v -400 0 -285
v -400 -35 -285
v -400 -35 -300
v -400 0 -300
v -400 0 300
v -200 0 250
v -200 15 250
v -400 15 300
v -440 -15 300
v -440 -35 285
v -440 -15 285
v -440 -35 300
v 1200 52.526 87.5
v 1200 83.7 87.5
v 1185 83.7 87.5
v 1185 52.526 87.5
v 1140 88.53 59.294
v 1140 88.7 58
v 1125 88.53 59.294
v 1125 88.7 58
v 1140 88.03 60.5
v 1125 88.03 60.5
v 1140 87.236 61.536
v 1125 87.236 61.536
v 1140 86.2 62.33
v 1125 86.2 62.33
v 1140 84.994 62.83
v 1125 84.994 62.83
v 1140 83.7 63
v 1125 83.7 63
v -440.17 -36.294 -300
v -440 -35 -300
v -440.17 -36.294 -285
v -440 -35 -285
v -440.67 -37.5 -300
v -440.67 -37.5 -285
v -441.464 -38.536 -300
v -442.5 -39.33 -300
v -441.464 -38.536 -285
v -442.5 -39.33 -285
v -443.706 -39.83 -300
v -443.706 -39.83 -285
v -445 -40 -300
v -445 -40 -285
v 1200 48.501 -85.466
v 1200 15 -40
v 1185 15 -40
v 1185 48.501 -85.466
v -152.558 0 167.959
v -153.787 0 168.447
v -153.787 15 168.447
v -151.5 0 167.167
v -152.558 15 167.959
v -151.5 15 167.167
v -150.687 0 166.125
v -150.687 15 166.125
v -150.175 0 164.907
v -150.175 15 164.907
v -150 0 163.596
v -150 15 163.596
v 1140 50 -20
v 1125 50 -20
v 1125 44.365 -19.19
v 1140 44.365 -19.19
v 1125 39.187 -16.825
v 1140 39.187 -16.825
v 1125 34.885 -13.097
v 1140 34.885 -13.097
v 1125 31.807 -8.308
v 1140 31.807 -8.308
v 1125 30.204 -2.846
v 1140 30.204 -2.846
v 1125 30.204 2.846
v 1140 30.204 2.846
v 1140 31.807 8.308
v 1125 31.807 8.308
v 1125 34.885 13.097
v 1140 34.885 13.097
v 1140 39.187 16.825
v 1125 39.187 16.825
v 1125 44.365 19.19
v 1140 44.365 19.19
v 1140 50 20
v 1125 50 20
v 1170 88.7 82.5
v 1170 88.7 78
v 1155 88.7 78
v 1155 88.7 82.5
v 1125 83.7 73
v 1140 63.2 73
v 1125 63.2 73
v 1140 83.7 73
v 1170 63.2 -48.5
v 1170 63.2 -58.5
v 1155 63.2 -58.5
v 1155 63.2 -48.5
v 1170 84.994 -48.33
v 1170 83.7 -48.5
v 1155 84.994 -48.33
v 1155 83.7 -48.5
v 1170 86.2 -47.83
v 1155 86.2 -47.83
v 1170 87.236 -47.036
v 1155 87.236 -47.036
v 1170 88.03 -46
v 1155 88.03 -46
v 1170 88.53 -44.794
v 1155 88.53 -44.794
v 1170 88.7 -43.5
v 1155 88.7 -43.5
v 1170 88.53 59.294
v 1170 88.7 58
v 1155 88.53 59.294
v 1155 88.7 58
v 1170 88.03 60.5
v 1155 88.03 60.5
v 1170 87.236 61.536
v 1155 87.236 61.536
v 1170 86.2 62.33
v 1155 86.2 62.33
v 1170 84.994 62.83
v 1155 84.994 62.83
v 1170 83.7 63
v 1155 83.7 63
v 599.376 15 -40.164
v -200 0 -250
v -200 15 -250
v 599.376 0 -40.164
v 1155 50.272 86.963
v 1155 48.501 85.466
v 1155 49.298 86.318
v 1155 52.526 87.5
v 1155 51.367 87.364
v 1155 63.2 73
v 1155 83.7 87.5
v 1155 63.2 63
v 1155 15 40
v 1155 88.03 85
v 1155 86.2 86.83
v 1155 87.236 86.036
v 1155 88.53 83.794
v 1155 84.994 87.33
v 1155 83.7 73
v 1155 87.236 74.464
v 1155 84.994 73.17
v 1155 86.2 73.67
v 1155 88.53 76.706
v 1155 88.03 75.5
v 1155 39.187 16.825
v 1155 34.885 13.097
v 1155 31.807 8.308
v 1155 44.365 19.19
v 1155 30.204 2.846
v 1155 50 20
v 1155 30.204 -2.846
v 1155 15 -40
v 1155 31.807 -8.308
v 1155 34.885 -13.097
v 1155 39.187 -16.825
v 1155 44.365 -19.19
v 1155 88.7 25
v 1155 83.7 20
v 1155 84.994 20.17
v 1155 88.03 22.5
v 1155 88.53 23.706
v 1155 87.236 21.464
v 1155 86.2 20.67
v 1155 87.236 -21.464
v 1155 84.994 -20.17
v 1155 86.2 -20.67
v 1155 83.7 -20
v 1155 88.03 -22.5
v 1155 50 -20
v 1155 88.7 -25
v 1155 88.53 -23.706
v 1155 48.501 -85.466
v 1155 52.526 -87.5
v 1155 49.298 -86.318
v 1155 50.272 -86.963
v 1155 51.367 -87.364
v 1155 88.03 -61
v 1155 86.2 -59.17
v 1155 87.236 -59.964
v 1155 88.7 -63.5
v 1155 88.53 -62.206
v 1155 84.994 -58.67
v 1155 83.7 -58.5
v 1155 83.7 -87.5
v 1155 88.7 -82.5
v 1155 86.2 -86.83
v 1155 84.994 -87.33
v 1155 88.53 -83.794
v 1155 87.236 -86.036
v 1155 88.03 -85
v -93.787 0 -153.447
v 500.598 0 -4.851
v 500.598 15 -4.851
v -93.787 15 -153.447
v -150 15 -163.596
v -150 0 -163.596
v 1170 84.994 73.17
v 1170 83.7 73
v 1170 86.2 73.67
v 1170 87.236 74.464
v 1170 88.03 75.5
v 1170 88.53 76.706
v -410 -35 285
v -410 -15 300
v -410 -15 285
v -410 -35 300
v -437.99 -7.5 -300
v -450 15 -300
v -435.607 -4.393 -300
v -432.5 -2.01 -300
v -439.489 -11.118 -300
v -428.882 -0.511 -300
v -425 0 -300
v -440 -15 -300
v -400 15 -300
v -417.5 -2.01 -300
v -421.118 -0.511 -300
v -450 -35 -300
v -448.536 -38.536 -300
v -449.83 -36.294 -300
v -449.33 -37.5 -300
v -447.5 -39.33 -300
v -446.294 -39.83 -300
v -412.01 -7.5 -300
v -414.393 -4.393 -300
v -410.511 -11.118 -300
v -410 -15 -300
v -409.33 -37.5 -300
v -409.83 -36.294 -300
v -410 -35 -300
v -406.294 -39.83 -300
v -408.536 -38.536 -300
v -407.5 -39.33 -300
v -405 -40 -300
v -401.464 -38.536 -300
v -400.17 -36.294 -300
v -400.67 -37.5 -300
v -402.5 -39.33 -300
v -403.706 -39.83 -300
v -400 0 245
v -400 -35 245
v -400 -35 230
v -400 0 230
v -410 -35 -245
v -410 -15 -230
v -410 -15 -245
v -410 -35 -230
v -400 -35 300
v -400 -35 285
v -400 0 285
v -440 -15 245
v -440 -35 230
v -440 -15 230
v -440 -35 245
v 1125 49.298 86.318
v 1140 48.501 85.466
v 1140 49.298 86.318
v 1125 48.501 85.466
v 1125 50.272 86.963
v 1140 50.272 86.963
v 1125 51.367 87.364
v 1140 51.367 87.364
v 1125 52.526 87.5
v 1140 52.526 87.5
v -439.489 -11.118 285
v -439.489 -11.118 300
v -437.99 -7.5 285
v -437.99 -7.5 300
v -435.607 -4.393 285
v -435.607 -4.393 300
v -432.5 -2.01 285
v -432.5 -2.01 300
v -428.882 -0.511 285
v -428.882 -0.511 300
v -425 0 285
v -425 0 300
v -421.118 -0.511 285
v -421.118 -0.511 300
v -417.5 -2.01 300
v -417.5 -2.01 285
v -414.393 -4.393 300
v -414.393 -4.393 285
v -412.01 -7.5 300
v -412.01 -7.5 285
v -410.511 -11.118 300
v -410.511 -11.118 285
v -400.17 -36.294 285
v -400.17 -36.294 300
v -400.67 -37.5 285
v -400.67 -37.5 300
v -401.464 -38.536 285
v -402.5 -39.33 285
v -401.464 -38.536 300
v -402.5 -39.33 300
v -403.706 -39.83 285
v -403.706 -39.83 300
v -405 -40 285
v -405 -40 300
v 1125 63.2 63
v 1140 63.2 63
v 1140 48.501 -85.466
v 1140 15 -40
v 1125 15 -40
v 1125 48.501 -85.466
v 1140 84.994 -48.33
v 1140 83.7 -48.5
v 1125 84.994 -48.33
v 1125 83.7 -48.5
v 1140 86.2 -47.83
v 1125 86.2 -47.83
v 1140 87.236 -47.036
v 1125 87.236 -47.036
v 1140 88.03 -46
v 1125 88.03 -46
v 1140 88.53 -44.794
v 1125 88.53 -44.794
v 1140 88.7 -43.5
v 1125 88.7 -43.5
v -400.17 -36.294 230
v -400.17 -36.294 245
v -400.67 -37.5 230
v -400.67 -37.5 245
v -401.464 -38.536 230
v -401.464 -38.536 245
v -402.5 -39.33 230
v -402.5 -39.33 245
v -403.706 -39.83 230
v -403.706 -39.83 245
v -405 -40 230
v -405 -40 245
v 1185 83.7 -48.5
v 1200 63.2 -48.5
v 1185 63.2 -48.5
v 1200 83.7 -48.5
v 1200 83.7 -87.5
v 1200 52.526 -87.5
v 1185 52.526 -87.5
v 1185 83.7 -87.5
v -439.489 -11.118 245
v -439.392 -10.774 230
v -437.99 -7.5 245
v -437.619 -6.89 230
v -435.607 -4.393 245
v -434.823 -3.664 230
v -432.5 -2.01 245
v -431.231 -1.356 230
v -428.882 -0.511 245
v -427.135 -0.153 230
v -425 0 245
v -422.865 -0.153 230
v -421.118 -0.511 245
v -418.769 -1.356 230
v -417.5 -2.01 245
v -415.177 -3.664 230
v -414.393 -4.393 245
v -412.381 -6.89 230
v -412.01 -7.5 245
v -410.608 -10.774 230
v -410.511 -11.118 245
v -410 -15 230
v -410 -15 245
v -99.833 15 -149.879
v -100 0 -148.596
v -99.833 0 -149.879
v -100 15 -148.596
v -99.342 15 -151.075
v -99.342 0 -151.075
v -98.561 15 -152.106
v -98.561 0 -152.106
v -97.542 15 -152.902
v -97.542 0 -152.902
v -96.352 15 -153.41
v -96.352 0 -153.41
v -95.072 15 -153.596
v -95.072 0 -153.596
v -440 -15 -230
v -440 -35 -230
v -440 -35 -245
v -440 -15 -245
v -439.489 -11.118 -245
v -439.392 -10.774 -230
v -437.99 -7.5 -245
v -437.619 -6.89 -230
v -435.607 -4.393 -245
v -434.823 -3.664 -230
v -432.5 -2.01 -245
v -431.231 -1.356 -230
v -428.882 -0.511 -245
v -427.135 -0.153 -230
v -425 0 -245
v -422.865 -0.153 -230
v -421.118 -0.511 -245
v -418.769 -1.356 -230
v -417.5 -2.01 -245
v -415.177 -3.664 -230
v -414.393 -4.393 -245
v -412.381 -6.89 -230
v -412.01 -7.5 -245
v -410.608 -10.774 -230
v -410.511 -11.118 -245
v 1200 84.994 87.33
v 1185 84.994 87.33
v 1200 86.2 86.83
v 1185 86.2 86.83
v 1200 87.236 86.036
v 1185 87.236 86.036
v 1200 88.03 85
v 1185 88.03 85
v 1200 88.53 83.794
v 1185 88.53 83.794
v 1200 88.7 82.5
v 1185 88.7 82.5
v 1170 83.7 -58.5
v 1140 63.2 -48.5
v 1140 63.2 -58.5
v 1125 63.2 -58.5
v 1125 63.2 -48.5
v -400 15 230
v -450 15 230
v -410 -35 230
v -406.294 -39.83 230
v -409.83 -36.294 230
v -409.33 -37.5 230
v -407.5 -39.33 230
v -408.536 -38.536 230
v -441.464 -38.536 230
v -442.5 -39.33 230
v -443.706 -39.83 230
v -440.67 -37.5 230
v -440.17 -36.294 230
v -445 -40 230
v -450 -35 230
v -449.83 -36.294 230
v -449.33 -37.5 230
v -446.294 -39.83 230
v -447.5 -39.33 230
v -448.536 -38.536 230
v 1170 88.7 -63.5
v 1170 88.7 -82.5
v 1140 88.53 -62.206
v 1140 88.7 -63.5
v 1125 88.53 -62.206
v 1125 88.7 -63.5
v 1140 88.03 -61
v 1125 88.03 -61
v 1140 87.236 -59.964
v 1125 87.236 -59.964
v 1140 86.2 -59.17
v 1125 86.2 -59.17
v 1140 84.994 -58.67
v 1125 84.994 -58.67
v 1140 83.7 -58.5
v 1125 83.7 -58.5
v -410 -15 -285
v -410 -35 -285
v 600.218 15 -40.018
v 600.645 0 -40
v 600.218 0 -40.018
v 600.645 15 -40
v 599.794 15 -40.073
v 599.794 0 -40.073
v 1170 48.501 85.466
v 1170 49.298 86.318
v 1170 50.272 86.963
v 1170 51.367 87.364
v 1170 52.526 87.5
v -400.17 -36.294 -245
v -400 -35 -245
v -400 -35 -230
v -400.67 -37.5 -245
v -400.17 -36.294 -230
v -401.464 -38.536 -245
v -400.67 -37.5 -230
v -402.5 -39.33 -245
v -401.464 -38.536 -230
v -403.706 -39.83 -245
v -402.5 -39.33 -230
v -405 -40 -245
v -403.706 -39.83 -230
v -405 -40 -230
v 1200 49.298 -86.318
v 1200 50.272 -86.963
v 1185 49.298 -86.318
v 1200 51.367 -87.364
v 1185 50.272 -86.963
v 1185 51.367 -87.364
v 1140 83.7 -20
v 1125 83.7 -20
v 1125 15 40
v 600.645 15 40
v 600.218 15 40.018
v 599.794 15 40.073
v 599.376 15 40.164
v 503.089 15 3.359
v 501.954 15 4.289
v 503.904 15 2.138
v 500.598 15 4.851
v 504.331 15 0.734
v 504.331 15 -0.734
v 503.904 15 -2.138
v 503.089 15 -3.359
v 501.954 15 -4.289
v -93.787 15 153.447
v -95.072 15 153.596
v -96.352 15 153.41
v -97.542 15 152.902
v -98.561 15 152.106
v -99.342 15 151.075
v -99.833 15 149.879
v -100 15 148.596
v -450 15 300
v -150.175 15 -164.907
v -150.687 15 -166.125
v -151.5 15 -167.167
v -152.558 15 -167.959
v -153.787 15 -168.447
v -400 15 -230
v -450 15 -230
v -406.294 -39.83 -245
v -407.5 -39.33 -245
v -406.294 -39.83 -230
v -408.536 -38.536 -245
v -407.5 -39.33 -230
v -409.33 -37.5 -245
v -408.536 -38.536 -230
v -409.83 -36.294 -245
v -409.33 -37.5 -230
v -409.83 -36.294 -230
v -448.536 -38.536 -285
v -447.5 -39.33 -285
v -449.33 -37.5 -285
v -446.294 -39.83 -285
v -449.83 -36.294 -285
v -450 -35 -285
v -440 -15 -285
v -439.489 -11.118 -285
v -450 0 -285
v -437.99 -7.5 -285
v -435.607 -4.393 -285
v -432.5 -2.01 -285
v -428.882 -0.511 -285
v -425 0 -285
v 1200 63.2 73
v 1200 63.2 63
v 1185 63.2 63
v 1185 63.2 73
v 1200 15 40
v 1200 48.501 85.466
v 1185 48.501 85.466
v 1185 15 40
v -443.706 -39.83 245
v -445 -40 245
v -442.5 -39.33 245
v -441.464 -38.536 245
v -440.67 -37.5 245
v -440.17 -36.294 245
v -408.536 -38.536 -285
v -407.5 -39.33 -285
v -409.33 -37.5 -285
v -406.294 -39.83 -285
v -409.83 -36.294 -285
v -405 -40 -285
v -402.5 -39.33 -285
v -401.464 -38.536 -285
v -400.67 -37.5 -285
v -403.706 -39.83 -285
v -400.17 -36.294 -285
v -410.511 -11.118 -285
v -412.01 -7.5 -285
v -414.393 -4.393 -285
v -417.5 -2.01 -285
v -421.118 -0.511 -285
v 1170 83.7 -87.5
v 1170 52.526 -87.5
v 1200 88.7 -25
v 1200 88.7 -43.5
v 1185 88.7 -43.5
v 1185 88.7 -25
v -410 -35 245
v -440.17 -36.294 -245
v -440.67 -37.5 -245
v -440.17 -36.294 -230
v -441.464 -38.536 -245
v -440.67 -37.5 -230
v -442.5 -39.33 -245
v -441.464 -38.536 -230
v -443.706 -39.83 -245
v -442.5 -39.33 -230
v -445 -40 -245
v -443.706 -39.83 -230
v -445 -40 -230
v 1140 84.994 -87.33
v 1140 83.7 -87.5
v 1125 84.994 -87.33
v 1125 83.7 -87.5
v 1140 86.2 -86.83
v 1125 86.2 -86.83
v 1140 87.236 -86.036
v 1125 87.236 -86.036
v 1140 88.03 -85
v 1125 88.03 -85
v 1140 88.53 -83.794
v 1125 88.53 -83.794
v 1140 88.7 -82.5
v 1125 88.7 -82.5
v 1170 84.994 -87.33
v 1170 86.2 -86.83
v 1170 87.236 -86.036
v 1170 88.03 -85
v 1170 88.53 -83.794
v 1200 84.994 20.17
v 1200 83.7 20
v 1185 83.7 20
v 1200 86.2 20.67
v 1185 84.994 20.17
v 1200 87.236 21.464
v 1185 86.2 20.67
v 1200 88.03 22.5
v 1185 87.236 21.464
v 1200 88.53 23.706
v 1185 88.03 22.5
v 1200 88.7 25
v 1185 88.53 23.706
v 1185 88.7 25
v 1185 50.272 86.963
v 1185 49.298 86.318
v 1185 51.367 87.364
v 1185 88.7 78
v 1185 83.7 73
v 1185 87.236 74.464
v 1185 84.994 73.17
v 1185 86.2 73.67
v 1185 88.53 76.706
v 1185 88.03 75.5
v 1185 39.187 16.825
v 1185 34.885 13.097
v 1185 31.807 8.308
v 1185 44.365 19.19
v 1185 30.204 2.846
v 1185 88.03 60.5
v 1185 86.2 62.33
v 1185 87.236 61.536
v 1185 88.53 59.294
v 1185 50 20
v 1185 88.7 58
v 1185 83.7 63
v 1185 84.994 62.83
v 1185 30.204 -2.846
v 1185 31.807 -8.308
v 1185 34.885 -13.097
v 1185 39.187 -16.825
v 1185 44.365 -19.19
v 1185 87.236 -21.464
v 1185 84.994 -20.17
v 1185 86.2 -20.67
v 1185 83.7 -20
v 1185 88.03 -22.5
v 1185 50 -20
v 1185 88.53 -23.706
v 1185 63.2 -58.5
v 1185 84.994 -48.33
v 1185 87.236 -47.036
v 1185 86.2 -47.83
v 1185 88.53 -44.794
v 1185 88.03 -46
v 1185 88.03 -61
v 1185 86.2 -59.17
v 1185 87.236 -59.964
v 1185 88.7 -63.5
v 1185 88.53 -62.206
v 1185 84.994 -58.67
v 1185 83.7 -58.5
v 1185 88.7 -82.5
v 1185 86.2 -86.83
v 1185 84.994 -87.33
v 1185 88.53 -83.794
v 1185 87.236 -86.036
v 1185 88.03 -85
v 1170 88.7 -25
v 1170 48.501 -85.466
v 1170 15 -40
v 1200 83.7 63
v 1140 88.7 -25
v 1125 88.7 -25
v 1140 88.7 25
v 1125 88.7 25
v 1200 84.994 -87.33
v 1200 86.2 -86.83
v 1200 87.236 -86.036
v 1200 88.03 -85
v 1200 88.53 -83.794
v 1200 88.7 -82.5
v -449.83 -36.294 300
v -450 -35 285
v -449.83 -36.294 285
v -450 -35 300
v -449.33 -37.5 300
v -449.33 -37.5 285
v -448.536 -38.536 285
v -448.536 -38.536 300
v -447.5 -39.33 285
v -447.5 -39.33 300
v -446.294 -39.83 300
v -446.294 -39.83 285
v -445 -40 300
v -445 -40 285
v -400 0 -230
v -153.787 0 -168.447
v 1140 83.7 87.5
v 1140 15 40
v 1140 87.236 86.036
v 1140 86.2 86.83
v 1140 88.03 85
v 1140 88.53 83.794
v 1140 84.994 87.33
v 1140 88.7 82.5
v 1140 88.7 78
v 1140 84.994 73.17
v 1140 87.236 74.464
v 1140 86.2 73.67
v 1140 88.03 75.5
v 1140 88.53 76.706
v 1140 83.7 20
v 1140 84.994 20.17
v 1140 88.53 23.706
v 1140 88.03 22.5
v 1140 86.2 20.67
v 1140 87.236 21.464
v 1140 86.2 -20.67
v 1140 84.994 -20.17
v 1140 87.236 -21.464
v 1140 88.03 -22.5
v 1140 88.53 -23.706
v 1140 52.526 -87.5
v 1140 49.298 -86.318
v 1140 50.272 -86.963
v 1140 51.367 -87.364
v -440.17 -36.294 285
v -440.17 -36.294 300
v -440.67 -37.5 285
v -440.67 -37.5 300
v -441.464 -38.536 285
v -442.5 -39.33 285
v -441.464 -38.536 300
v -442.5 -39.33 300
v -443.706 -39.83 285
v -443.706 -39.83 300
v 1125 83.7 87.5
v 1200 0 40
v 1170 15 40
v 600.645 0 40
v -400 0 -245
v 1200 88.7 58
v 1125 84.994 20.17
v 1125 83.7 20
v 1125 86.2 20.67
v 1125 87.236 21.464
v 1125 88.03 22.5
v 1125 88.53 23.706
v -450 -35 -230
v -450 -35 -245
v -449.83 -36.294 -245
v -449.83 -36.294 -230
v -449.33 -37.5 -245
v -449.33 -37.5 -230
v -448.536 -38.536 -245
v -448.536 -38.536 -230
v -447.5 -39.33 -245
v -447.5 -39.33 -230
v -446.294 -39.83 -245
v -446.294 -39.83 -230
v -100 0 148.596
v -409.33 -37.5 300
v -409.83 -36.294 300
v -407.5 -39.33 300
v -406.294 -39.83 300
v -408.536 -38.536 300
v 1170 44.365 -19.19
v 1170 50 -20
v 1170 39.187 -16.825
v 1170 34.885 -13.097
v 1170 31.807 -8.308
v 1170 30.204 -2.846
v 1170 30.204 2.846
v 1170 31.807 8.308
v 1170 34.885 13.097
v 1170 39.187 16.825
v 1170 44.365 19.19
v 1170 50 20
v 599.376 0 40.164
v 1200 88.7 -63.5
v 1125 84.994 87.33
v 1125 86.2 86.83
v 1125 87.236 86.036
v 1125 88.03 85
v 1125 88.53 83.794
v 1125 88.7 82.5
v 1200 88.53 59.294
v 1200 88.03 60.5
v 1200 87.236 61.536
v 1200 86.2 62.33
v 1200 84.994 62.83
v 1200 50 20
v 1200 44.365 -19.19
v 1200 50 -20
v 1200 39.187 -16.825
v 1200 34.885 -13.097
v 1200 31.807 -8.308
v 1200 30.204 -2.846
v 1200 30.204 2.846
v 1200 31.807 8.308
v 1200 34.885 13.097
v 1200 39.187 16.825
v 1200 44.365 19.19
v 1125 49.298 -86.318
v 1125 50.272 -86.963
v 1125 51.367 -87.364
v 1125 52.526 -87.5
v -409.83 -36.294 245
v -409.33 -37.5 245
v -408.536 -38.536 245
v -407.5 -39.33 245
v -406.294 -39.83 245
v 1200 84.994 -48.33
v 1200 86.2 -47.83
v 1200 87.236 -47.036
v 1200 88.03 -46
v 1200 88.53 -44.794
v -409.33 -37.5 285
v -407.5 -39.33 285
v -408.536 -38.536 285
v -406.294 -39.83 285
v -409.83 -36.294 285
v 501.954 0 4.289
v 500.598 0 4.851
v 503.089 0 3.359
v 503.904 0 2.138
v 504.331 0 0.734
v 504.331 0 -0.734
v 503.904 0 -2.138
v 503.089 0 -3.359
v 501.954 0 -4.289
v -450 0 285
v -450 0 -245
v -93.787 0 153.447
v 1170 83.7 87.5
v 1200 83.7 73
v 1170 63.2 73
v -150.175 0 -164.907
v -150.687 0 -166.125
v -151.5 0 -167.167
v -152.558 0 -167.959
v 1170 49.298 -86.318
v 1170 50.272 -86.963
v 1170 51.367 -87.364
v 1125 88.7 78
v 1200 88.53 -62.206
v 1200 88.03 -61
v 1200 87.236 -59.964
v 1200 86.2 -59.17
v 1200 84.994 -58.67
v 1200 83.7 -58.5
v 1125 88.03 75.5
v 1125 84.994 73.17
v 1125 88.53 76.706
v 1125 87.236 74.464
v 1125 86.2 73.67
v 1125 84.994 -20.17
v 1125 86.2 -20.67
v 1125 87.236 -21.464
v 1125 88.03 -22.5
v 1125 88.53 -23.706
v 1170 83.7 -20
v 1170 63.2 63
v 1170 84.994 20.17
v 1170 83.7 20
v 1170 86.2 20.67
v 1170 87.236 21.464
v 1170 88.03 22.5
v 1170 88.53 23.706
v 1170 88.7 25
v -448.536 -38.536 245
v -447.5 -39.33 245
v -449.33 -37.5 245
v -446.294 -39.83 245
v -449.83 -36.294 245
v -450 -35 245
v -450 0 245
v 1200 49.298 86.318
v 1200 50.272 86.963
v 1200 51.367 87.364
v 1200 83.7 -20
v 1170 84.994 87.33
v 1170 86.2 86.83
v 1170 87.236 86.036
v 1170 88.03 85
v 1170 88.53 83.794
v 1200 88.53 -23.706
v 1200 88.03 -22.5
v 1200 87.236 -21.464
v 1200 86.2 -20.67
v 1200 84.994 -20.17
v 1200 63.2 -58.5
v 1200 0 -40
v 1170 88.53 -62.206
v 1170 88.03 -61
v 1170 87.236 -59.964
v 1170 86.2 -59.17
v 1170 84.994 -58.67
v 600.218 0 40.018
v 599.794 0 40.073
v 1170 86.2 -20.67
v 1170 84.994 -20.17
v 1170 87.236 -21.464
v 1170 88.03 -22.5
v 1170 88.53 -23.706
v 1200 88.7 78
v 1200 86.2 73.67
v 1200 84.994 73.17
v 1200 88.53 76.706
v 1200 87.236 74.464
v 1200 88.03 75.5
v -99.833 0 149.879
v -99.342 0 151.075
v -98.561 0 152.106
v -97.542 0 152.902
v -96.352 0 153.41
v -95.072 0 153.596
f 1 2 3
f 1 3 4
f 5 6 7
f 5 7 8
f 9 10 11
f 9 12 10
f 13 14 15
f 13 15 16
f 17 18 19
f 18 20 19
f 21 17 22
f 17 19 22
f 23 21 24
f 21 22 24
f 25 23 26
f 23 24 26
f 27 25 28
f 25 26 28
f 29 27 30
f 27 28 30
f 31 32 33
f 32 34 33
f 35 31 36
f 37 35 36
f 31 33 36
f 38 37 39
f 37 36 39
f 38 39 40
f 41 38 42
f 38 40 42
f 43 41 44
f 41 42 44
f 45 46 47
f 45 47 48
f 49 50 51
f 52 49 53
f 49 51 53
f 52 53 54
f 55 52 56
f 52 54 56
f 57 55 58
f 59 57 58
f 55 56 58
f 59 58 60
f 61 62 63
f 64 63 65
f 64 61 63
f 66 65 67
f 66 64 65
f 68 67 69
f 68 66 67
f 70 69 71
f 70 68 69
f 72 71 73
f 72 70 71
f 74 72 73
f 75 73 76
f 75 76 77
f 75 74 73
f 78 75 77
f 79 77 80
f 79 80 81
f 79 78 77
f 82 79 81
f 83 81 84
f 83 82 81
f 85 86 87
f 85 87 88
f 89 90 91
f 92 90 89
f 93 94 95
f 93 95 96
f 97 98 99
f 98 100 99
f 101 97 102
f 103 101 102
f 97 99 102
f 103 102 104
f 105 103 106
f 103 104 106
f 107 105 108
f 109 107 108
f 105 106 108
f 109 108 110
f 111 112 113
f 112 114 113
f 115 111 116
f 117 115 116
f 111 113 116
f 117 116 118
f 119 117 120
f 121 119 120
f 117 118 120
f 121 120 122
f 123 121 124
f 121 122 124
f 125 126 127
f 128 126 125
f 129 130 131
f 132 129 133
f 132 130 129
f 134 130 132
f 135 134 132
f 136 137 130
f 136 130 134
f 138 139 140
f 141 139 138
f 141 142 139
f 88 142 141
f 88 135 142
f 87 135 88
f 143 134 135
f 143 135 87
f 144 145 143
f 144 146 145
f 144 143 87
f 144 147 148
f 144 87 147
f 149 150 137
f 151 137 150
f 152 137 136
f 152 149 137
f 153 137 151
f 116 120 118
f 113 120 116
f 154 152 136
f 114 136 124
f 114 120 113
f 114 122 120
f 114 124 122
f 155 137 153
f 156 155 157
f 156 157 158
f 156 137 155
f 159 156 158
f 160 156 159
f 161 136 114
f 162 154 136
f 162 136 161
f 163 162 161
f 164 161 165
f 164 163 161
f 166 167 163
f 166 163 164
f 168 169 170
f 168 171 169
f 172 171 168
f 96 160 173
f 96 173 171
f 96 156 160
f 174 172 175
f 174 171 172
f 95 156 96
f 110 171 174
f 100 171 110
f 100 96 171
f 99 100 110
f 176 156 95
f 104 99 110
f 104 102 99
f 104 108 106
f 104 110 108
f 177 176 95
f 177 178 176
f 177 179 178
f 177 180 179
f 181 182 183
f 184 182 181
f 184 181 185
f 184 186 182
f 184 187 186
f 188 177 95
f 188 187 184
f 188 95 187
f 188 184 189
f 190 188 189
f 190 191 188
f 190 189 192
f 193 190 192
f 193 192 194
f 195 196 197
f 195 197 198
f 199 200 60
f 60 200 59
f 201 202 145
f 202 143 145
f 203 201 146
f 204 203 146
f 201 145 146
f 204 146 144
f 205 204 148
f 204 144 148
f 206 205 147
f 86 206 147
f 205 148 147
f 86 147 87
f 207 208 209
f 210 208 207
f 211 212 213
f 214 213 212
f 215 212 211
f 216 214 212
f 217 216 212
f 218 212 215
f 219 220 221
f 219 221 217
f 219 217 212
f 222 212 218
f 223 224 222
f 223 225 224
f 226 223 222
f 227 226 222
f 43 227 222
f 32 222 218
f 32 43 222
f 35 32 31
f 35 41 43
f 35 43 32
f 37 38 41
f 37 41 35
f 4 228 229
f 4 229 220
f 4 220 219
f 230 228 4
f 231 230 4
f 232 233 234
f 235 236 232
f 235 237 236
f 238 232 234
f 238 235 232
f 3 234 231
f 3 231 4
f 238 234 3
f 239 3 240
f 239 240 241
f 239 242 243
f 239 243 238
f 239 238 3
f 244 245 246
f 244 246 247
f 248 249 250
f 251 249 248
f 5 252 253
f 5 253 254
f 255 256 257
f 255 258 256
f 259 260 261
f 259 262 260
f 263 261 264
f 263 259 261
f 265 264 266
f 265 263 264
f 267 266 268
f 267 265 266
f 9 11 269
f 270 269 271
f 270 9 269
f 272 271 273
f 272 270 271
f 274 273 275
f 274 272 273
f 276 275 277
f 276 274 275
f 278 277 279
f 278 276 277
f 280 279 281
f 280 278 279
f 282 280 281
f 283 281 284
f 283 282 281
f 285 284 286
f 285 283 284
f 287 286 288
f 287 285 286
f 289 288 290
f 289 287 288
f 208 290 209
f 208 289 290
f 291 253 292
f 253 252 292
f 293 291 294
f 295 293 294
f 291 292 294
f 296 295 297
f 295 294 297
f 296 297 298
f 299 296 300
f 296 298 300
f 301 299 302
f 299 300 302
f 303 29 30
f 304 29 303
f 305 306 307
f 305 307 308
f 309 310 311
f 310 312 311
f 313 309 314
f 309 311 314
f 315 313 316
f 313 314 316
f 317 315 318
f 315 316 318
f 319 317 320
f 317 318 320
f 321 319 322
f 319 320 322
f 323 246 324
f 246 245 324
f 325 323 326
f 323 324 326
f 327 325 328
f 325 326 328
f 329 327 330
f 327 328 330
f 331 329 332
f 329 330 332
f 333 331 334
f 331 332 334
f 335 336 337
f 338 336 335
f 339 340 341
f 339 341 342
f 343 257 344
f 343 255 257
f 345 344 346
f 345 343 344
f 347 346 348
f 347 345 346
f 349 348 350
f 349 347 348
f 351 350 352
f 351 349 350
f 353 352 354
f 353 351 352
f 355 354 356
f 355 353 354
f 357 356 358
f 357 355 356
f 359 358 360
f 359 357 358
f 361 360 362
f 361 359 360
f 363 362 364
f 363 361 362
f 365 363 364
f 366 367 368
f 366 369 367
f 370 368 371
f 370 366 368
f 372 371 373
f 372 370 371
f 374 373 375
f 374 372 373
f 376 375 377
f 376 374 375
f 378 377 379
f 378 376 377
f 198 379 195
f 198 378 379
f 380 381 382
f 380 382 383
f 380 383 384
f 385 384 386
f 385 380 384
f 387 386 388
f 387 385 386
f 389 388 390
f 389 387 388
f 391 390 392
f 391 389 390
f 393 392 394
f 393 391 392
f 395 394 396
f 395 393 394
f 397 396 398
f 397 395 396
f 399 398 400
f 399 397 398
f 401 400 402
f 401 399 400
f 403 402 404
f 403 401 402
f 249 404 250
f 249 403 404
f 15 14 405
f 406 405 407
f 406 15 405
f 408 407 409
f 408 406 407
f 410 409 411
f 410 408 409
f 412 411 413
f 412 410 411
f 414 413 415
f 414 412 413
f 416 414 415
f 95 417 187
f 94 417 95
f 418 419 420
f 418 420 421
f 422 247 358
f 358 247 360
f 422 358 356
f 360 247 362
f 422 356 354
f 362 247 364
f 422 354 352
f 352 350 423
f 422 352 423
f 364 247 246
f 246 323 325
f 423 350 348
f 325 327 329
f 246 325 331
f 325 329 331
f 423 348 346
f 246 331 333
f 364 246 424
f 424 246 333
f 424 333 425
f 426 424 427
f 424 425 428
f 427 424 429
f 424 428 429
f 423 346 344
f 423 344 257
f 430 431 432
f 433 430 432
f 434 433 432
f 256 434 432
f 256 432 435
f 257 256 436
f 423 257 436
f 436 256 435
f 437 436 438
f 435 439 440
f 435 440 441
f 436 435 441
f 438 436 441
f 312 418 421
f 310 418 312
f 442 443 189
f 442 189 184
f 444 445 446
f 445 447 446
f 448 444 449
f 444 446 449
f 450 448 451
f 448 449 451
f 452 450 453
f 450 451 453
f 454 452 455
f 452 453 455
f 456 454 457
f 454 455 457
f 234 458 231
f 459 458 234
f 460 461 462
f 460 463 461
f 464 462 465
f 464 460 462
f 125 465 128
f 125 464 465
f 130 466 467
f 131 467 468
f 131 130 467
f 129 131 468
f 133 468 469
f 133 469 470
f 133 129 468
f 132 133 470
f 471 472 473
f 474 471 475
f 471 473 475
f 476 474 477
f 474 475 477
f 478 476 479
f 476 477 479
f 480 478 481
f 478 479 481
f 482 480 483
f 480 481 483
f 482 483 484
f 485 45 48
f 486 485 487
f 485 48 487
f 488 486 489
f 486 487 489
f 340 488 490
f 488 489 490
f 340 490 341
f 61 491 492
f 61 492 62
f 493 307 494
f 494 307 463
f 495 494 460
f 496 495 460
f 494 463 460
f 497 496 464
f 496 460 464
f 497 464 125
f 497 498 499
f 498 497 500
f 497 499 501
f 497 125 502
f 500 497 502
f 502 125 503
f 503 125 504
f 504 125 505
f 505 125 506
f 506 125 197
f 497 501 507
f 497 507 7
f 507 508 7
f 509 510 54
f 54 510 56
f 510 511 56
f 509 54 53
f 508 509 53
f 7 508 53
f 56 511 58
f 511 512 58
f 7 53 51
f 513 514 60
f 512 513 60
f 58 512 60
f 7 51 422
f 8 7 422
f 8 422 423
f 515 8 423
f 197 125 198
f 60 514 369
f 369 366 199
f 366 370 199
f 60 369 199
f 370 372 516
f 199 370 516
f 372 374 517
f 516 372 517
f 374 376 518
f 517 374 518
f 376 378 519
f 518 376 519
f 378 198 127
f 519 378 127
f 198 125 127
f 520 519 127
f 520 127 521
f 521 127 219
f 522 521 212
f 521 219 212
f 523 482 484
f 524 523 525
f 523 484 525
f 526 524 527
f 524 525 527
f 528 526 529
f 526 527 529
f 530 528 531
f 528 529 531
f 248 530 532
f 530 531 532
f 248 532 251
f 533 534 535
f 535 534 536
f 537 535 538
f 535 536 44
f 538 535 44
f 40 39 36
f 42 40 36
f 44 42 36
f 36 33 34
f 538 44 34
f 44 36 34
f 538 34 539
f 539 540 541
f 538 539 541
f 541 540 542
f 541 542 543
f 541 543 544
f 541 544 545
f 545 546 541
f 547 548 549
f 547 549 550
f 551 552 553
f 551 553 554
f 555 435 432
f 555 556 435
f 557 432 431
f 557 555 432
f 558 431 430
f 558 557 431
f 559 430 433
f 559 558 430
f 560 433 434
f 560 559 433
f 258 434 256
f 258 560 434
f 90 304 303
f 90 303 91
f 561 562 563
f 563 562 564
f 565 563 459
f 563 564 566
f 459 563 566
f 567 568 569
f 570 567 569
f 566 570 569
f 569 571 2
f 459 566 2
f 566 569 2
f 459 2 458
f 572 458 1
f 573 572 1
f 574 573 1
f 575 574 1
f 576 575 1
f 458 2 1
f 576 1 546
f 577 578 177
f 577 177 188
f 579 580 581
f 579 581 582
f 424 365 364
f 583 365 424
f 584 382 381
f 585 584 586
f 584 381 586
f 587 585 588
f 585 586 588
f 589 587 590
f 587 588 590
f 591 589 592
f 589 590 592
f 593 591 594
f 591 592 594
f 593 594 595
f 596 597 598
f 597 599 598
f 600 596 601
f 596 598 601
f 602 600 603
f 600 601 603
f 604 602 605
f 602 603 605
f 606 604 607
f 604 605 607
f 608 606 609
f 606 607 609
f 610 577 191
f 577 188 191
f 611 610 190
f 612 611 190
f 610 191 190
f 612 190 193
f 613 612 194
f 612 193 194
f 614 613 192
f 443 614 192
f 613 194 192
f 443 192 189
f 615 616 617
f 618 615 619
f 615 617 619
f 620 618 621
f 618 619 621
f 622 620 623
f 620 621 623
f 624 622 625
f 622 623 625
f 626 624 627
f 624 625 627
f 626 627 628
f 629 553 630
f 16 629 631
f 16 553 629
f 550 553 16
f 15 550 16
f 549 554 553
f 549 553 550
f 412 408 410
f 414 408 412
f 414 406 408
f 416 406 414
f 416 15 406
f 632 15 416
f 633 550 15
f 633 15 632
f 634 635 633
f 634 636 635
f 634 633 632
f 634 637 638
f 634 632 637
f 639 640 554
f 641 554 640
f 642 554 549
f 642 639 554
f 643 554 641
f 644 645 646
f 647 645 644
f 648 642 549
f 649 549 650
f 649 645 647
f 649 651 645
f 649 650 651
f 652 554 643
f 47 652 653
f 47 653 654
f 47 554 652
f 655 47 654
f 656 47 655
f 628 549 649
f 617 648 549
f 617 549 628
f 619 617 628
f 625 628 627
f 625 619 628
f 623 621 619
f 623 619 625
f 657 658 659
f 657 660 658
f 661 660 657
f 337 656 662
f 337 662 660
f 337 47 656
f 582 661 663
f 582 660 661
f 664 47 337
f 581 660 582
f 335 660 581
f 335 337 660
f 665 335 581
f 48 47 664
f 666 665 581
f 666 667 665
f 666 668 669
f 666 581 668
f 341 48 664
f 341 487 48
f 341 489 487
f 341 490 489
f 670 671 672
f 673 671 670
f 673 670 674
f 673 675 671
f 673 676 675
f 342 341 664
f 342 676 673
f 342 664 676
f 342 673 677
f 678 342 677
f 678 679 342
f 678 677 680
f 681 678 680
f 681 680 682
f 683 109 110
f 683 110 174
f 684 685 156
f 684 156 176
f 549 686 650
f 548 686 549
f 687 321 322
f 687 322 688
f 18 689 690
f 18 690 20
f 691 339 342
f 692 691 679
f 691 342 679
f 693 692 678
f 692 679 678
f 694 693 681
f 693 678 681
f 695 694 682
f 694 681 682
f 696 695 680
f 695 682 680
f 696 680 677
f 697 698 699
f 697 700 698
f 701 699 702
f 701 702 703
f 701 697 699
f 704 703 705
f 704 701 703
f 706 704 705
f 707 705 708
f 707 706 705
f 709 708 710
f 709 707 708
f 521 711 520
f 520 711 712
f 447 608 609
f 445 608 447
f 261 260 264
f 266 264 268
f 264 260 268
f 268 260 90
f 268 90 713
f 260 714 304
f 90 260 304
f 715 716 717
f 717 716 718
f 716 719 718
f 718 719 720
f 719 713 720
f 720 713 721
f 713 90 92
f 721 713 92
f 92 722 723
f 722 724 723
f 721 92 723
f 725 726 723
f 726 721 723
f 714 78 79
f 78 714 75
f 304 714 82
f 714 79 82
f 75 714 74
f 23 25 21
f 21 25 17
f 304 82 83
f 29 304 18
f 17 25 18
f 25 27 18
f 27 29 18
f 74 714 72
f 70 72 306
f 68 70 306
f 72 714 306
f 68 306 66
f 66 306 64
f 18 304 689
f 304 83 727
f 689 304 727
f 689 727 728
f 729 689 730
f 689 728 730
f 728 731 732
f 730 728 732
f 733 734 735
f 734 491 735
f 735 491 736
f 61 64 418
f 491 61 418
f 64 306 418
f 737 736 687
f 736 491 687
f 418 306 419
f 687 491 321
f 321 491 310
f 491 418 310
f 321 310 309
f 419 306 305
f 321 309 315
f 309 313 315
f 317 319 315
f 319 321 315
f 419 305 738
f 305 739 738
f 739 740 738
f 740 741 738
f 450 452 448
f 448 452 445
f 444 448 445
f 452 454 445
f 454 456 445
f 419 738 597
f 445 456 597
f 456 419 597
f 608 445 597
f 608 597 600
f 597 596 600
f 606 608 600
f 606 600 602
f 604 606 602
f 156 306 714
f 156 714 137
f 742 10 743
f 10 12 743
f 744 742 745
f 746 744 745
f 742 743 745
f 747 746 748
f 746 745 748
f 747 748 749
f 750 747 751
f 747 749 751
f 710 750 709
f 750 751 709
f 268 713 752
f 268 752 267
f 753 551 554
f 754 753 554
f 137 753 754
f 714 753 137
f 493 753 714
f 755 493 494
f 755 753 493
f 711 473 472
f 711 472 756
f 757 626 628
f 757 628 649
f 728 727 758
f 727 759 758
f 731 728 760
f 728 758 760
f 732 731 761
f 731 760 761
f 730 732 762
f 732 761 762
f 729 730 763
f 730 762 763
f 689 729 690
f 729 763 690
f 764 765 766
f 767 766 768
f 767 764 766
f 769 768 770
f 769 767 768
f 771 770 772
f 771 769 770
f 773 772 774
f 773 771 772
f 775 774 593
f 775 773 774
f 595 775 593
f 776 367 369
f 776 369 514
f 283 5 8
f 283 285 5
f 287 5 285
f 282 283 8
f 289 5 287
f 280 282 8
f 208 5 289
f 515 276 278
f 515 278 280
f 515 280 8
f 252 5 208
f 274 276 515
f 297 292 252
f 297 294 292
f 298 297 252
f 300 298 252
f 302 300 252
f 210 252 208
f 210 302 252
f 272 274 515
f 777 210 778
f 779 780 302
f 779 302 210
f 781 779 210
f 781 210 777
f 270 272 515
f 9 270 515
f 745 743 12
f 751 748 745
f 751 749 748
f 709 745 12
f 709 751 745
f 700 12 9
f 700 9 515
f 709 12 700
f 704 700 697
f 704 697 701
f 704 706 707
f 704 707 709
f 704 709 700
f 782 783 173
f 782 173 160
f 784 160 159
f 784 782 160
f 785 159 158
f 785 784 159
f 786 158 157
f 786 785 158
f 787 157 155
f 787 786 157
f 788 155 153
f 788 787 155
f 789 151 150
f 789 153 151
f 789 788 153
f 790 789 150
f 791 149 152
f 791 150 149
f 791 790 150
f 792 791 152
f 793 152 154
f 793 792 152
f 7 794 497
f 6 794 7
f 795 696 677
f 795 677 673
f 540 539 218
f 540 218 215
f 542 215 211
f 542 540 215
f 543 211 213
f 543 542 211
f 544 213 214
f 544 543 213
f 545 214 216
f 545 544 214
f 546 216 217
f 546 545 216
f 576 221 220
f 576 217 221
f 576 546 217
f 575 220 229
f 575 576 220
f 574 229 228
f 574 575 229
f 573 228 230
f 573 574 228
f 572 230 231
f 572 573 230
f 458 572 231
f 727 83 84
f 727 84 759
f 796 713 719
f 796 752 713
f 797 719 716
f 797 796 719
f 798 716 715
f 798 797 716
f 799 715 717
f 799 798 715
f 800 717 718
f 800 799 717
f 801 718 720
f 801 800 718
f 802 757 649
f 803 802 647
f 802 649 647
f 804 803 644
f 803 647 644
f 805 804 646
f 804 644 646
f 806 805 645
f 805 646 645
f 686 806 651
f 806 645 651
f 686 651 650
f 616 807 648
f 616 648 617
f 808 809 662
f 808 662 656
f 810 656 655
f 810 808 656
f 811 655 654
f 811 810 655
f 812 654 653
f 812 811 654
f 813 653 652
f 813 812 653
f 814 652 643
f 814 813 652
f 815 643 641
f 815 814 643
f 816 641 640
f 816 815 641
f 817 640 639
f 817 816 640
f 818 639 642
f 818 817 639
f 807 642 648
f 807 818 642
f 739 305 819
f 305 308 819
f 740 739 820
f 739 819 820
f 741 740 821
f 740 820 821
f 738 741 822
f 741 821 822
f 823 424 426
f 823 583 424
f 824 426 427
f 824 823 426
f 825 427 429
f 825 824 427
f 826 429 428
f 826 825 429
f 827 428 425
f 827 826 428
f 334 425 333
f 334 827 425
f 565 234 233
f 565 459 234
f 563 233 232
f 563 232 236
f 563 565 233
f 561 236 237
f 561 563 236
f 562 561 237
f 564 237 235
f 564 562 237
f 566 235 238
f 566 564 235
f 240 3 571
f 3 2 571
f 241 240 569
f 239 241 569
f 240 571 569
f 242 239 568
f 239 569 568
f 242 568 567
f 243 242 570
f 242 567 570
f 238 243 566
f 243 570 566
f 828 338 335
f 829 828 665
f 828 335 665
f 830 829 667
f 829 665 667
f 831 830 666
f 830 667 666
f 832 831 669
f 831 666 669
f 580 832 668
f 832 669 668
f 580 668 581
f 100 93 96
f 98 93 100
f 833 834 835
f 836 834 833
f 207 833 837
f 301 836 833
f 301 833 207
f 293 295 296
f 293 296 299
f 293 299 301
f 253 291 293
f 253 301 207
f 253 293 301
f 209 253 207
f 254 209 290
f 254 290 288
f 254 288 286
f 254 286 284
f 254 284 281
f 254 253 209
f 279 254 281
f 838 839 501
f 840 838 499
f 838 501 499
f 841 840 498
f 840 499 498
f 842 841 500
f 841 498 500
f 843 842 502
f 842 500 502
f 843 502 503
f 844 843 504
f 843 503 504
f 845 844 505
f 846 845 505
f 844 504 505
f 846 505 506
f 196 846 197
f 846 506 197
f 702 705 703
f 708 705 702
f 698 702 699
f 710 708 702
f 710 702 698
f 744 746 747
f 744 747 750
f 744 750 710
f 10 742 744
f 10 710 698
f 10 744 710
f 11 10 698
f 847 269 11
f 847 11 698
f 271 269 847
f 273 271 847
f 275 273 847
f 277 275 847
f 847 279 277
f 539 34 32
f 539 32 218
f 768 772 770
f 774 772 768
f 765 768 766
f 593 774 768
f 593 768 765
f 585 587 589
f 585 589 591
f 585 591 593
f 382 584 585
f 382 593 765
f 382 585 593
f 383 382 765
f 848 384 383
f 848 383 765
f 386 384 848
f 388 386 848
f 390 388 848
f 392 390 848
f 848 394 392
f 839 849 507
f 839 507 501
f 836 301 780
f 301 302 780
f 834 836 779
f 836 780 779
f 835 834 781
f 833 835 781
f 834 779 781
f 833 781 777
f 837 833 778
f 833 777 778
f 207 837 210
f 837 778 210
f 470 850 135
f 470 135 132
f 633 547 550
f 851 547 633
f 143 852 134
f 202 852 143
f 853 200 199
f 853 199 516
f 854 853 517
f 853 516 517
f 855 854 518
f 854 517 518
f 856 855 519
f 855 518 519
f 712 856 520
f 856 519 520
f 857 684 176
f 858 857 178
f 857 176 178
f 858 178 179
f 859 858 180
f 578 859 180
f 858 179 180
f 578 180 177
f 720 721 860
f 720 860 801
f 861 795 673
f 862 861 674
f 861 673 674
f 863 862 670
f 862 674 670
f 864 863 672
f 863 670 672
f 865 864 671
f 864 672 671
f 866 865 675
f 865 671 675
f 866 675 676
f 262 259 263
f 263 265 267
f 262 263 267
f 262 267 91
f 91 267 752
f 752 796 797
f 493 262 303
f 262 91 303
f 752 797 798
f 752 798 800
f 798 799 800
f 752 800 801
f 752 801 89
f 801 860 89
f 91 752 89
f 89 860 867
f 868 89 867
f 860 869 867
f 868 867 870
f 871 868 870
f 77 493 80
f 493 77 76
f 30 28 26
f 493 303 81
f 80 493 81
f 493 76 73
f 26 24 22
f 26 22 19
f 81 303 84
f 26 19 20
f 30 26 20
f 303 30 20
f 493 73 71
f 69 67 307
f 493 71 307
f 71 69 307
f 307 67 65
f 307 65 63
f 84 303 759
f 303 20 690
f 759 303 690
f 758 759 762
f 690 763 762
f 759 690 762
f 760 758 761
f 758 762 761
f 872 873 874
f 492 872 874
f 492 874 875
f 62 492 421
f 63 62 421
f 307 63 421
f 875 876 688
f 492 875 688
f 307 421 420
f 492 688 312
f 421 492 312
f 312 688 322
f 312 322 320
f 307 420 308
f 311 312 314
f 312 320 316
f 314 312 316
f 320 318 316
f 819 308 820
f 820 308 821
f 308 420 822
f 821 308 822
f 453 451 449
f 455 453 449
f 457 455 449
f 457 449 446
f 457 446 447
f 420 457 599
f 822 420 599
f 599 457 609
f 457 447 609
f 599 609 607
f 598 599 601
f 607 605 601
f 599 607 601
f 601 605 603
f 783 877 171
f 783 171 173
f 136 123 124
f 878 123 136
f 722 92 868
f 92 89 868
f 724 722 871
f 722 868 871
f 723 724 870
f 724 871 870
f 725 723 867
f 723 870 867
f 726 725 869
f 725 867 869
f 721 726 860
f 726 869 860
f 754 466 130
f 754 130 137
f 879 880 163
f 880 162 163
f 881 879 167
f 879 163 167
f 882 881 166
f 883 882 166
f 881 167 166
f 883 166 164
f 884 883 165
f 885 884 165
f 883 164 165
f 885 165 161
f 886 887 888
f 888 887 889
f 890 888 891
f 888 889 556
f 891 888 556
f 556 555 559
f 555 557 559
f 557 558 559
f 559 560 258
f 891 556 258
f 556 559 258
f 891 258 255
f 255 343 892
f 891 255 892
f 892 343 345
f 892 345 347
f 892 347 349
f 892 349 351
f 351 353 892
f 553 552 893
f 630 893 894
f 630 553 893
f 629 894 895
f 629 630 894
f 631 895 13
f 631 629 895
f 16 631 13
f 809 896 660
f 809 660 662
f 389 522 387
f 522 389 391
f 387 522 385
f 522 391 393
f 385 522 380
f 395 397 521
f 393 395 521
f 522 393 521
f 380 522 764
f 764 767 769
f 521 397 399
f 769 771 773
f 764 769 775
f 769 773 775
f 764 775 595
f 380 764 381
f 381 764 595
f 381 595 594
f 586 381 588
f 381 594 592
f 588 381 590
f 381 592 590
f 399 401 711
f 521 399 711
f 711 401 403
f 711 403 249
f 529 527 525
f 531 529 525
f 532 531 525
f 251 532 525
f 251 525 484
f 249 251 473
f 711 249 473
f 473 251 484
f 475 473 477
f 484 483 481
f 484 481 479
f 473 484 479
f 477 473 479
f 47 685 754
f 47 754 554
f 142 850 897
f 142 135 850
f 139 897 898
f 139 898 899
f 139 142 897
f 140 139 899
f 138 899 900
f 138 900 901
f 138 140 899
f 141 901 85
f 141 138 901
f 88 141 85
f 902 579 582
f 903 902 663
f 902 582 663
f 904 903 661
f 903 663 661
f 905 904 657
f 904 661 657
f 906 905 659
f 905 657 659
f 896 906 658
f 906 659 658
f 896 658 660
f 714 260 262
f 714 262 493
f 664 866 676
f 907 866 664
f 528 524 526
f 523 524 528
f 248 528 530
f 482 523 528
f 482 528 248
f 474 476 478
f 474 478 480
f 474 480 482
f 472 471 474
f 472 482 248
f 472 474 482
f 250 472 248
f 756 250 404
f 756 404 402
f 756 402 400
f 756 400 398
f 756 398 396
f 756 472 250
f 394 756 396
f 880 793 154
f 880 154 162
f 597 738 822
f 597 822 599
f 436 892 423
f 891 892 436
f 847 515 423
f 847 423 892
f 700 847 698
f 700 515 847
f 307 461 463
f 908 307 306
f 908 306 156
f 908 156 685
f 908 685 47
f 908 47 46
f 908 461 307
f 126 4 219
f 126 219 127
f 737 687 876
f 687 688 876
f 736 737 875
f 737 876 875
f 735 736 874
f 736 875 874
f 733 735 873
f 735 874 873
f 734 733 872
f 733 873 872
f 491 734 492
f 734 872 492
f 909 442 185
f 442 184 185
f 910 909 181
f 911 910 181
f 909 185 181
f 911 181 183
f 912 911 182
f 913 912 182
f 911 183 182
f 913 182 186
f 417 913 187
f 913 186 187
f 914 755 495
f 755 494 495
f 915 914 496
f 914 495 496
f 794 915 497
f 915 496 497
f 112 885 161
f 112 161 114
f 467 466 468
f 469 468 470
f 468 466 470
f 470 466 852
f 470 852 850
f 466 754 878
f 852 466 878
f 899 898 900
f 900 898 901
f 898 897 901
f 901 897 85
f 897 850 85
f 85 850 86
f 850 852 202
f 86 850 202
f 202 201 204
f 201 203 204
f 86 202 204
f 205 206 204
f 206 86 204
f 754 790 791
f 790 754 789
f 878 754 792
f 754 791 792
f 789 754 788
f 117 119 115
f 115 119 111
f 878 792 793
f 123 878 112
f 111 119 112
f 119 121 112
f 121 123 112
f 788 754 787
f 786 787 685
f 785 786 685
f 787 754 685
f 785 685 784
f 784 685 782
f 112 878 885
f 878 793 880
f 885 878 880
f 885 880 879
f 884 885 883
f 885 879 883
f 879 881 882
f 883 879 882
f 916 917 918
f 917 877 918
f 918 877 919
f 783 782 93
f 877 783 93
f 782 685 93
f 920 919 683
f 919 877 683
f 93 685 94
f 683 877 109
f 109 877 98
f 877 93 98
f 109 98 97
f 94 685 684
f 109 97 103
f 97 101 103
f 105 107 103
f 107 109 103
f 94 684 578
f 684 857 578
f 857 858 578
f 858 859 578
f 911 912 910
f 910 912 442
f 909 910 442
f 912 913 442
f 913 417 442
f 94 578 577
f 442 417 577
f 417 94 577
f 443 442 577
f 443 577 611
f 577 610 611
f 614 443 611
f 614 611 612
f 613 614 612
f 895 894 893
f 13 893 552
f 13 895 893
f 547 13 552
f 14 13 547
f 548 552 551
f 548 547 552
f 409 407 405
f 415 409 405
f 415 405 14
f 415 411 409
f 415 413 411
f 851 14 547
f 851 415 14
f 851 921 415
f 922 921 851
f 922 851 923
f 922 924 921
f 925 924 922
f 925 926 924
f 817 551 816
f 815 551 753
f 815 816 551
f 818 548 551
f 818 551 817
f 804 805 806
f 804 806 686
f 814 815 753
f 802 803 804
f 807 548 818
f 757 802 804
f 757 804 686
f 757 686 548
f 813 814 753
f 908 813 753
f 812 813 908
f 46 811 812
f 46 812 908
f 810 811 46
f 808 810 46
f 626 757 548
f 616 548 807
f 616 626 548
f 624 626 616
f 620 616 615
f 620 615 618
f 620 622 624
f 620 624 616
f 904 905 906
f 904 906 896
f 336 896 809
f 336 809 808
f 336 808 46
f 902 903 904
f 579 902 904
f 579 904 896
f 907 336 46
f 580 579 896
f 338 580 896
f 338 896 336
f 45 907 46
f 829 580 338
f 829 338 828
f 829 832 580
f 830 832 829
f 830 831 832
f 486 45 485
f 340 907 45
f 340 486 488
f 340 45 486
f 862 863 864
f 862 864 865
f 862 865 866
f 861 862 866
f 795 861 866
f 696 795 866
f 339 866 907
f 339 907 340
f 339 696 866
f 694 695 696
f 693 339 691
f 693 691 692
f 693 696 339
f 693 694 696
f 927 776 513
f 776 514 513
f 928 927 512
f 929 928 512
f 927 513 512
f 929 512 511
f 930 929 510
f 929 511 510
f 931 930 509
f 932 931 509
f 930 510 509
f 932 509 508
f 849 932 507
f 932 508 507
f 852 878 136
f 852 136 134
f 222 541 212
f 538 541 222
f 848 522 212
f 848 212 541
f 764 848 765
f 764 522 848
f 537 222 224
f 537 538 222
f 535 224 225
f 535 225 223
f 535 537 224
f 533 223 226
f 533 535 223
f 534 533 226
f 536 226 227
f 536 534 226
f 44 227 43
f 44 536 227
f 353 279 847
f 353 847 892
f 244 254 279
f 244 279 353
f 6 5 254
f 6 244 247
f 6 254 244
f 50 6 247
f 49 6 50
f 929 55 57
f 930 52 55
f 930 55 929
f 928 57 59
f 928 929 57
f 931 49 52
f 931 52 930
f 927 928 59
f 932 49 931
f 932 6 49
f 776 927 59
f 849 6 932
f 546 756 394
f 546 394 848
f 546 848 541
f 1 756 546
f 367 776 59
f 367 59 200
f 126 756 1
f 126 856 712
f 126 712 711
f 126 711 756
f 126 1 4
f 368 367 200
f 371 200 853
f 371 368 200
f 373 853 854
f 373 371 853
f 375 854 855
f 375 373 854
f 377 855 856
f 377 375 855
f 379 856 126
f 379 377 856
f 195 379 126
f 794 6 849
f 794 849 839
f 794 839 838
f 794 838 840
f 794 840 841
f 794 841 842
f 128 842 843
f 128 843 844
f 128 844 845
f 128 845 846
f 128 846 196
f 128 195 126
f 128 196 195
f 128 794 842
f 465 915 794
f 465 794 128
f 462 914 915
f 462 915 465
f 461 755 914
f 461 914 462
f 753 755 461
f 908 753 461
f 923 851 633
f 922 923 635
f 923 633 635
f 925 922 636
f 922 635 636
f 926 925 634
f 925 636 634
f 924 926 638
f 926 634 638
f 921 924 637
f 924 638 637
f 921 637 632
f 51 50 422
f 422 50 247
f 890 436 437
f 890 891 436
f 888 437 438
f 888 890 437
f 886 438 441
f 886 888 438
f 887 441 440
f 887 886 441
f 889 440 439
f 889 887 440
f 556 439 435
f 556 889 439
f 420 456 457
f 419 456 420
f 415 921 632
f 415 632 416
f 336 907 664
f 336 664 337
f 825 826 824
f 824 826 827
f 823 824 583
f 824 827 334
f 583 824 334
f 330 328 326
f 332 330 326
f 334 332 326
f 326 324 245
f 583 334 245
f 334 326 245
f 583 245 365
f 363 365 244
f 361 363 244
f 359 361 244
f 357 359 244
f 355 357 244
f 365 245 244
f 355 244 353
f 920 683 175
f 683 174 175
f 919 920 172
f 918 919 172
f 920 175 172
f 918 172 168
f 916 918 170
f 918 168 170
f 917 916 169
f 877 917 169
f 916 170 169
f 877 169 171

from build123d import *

# Parameters (mm, degrees)
BOSS_EXTRUDE1_DEPTH             = 15
BOSS_EXTRUDE2_REACH             = 1239.023
BOSS_EXTRUDE2_DIRECTION_2_REACH = 1239.023
CUT_EXTRUDE2_DEPTH              = 1238.578280352
CUT_EXTRUDE2_DEPTH_BACK         = 1238.578280352
SKETCH5_W                       = 40
SKETCH5_H                       = 40
CUT_EXTRUDE3_DEPTH              = 1238.578280352
BOSS_EXTRUDE4_DEPTH             = 75
CUT_EXTRUDE4_DEPTH              = 1241.107934819
CUT_EXTRUDE4_DEPTH_BACK         = 1241.107934819
SKETCH8_W                       = 15
SKETCH8_H                       = 73.7
FILLET1_R                       = 5


with BuildPart() as part:
    # Sketch1 → Boss-Extrude1 (new body)
    with BuildSketch(Plane(origin=(0, 0, 0), x_dir=(1, 0, 0), z_dir=(0, 1, 0))):
        Polygon((-450, 300), (-400, 300), (-200, 250), (600, 40), (1200, 40), (1200, -40), (600, -40), (-200, -250), (-400, -300), (-450, -300), align=None)
    extrude(amount=BOSS_EXTRUDE1_DEPTH)

    # Boss-Extrude2: up to this face of the body (flat: up to its plane)
    boss_extrude2_end = Plane(part.part.faces().sort_by_distance((-425, 7.5, 300))[0])
    # Sketch2 → Boss-Extrude2 (add, up to the picked face)
    with BuildSketch(Plane.XY, mode=Mode.PRIVATE) as boss_extrude2_sk1:
        with BuildLine():
            Line((-425, 0), (-450, 0))
            Line((-450, 0), (-450, -40))
            Line((-450, -40), (-440, -40))
            Line((-440, -40), (-440, -15))
            ThreePointArc((-440, -15), (-435.606601718, -4.393398282), (-425, 0))
        make_face()
    boss_extrude2_tool1 = split(extrude(boss_extrude2_sk1.sketch, amount=BOSS_EXTRUDE2_REACH, mode=Mode.PRIVATE), bisect_by=boss_extrude2_end, keep=Keep.BOTH, mode=Mode.PRIVATE)
    # Sketch2 → Boss-Extrude2 (add, up to the picked face)
    with BuildSketch(Plane.XY, mode=Mode.PRIVATE) as boss_extrude2_sk2:
        with BuildLine():
            Line((-400, 0), (-425, 0))
            ThreePointArc((-425, 0), (-414.393398282, -4.393398282), (-410, -15))
            Line((-410, -15), (-410, -40))
            Line((-410, -40), (-400, -40))
            Line((-400, -40), (-400, 0))
        make_face()
    boss_extrude2_tool2 = split(extrude(boss_extrude2_sk2.sketch, amount=BOSS_EXTRUDE2_REACH, mode=Mode.PRIVATE), bisect_by=boss_extrude2_end, keep=Keep.BOTH, mode=Mode.PRIVATE)
    add(boss_extrude2_tool1.solids().sort_by(Axis((-444.100555, -18.206662, 0), (0, 0, 1)))[0])
    add(boss_extrude2_tool2.solids().sort_by(Axis((-405.899445, -18.206662, 0), (0, 0, 1)))[0])

    # Boss-Extrude2 direction 2: up to this face of the body (flat: up to its plane)
    boss_extrude2_direction_2_end = Plane(part.part.faces().sort_by_distance((-425, 7.5, -300))[0])
    # Sketch2 → Boss-Extrude2 direction 2 (add, up to the picked face)
    with BuildSketch(Plane.XY, mode=Mode.PRIVATE) as boss_extrude2_direction_2_sk1:
        with BuildLine():
            Line((-425, 0), (-450, 0))
            Line((-450, 0), (-450, -40))
            Line((-450, -40), (-440, -40))
            Line((-440, -40), (-440, -15))
            ThreePointArc((-440, -15), (-435.606601718, -4.393398282), (-425, 0))
        make_face()
    boss_extrude2_direction_2_tool1 = split(extrude(boss_extrude2_direction_2_sk1.sketch, amount=-BOSS_EXTRUDE2_DIRECTION_2_REACH, mode=Mode.PRIVATE), bisect_by=boss_extrude2_direction_2_end, keep=Keep.BOTH, mode=Mode.PRIVATE)
    # Sketch2 → Boss-Extrude2 direction 2 (add, up to the picked face)
    with BuildSketch(Plane.XY, mode=Mode.PRIVATE) as boss_extrude2_direction_2_sk2:
        with BuildLine():
            Line((-400, 0), (-425, 0))
            ThreePointArc((-425, 0), (-414.393398282, -4.393398282), (-410, -15))
            Line((-410, -15), (-410, -40))
            Line((-410, -40), (-400, -40))
            Line((-400, -40), (-400, 0))
        make_face()
    boss_extrude2_direction_2_tool2 = split(extrude(boss_extrude2_direction_2_sk2.sketch, amount=-BOSS_EXTRUDE2_DIRECTION_2_REACH, mode=Mode.PRIVATE), bisect_by=boss_extrude2_direction_2_end, keep=Keep.BOTH, mode=Mode.PRIVATE)
    add(boss_extrude2_direction_2_tool1.solids().sort_by(Axis((-444.100555, -18.206662, 0), (0, 0, -1)))[0])
    add(boss_extrude2_direction_2_tool2.solids().sort_by(Axis((-405.899445, -18.206662, 0), (0, 0, -1)))[0])

    # Sketch4 → Cut-Extrude2 (cut, two sides: drawn at the far end of the back side and taken through both)
    with BuildSketch(Plane(origin=(0, 0, 0), x_dir=(1, 0, 0), z_dir=(0, 1, 0)).offset(-CUT_EXTRUDE2_DEPTH_BACK)):
        Polygon((-450, 230), (-400, 230), (-150, 167.5), (-150, -167.5), (-400, -230), (-450, -230), align=None)
        Polygon((-100, 155), (-100, -155), (520, 0), align=None)
    extrude(amount=CUT_EXTRUDE2_DEPTH + CUT_EXTRUDE2_DEPTH_BACK, mode=Mode.SUBTRACT)

    # Sketch5 → Cut-Extrude3 (cut, through all)
    with BuildSketch(Plane(origin=(0, 0, 0), x_dir=(0, 0, -1), z_dir=(1, 0, 0))):
        with Locations((-265, -20)):
            Rectangle(SKETCH5_W, SKETCH5_H)
        with Locations((265, -20)):
            Rectangle(SKETCH5_W, SKETCH5_H)
    extrude(amount=-CUT_EXTRUDE3_DEPTH, mode=Mode.SUBTRACT)

    # Sketch7 → Boss-Extrude4 (add)
    with BuildSketch(Plane(origin=(1200, 0, 0), x_dir=(0, 0, -1), z_dir=(1, 0, 0))):
        with BuildLine():
            Line((-87.5, 50), (-40, 15))
            Line((-40, 15), (40, 15))
            Line((40, 15), (87.5, 50))
            Line((87.5, 50), (87.5, 88.7))
            Line((87.5, 88.7), (58.5, 88.7))
            Line((58.5, 88.7), (58.5, 63.2))
            Line((58.5, 63.2), (48.5, 63.2))
            Line((48.5, 63.2), (48.5, 88.7))
            Line((48.5, 88.7), (20, 88.7))
            Line((20, 88.7), (20, 50))
            ThreePointArc((20, 50), (0, 30), (-20, 50))
            Line((-20, 50), (-20, 88.7))
            Line((-20, 88.7), (-63, 88.7))
            Line((-63, 88.7), (-63, 63.2))
            Line((-63, 63.2), (-73, 63.2))
            Line((-73, 63.2), (-73, 88.7))
            Line((-73, 88.7), (-87.5, 88.7))
            Line((-87.5, 88.7), (-87.5, 50))
        make_face()
    extrude(amount=-BOSS_EXTRUDE4_DEPTH)

    # Sketch8 → Cut-Extrude4 (cut, two sides: drawn at the far end of the back side and taken through both)
    with BuildSketch(Plane.XY.offset(-CUT_EXTRUDE4_DEPTH_BACK)):
        with Locations((1147.5, 51.85)):
            Rectangle(SKETCH8_W, SKETCH8_H)
        with Locations((1177.5, 51.85)):
            Rectangle(SKETCH8_W, SKETCH8_H)
    extrude(amount=CUT_EXTRUDE4_DEPTH + CUT_EXTRUDE4_DEPTH_BACK, mode=Mode.SUBTRACT)

    # Fillet1
    fillet1_edges = [part.edges().sort_by_distance(p)[0] for p in [
        (1192.5, 50, 87.5),
        (1162.5, 50, 87.5),
        (1132.5, 50, 87.5),
        (1192.5, 50, -87.5),
        (1162.5, 50, -87.5),
        (1132.5, 50, -87.5),
        (1192.5, 88.7, -87.5),
        (1162.5, 88.7, -87.5),
        (1132.5, 88.7, -87.5),
        (1132.5, 88.7, -58.5),
        (1162.5, 88.7, -58.5),
        (1192.5, 88.7, -58.5),
        (1192.5, 88.7, -48.5),
        (1162.5, 88.7, -48.5),
        (1132.5, 88.7, -48.5),
        (1192.5, 88.7, -20),
        (1162.5, 88.7, -20),
        (1132.5, 88.7, -20),
        (1192.5, 88.7, 63),
        (1162.5, 88.7, 63),
        (1132.5, 88.7, 63),
        (1132.5, 88.7, 87.5),
        (1162.5, 88.7, 87.5),
        (1192.5, 88.7, 87.5),
        (1192.5, 88.7, 73),
        (1162.5, 88.7, 73),
        (1132.5, 88.7, 73),
        (1192.5, 88.7, 20),
        (1162.5, 88.7, 20),
        (1132.5, 88.7, 20),
        (600, 7.5, 40),
        (600, 7.5, -40),
        (520, 7.5, 0),
        (-440, -40, -292.5),
        (-440, -40, -237.5),
        (-400, -40, -292.5),
        (-400, -40, -237.5),
        (-450, -40, -237.5),
        (-410, -40, -237.5),
        (-450, -40, -292.5),
        (-410, -40, -292.5),
        (-150, 7.5, 167.5),
        (-100, 7.5, 155),
        (-150, 7.5, -167.5),
        (-100, 7.5, -155),
        (-450, -40, 237.5),
        (-410, -40, 237.5),
        (-440, -40, 237.5),
        (-400, -40, 237.5),
        (-450, -40, 292.5),
        (-440, -40, 292.5),
        (-400, -40, 292.5),
        (-410, -40, 292.5),
    ]]
    fillet(fillet1_edges, radius=FILLET1_R - 0.0001)  # a hair under: the kernel refuses the full size


solid = part.part
